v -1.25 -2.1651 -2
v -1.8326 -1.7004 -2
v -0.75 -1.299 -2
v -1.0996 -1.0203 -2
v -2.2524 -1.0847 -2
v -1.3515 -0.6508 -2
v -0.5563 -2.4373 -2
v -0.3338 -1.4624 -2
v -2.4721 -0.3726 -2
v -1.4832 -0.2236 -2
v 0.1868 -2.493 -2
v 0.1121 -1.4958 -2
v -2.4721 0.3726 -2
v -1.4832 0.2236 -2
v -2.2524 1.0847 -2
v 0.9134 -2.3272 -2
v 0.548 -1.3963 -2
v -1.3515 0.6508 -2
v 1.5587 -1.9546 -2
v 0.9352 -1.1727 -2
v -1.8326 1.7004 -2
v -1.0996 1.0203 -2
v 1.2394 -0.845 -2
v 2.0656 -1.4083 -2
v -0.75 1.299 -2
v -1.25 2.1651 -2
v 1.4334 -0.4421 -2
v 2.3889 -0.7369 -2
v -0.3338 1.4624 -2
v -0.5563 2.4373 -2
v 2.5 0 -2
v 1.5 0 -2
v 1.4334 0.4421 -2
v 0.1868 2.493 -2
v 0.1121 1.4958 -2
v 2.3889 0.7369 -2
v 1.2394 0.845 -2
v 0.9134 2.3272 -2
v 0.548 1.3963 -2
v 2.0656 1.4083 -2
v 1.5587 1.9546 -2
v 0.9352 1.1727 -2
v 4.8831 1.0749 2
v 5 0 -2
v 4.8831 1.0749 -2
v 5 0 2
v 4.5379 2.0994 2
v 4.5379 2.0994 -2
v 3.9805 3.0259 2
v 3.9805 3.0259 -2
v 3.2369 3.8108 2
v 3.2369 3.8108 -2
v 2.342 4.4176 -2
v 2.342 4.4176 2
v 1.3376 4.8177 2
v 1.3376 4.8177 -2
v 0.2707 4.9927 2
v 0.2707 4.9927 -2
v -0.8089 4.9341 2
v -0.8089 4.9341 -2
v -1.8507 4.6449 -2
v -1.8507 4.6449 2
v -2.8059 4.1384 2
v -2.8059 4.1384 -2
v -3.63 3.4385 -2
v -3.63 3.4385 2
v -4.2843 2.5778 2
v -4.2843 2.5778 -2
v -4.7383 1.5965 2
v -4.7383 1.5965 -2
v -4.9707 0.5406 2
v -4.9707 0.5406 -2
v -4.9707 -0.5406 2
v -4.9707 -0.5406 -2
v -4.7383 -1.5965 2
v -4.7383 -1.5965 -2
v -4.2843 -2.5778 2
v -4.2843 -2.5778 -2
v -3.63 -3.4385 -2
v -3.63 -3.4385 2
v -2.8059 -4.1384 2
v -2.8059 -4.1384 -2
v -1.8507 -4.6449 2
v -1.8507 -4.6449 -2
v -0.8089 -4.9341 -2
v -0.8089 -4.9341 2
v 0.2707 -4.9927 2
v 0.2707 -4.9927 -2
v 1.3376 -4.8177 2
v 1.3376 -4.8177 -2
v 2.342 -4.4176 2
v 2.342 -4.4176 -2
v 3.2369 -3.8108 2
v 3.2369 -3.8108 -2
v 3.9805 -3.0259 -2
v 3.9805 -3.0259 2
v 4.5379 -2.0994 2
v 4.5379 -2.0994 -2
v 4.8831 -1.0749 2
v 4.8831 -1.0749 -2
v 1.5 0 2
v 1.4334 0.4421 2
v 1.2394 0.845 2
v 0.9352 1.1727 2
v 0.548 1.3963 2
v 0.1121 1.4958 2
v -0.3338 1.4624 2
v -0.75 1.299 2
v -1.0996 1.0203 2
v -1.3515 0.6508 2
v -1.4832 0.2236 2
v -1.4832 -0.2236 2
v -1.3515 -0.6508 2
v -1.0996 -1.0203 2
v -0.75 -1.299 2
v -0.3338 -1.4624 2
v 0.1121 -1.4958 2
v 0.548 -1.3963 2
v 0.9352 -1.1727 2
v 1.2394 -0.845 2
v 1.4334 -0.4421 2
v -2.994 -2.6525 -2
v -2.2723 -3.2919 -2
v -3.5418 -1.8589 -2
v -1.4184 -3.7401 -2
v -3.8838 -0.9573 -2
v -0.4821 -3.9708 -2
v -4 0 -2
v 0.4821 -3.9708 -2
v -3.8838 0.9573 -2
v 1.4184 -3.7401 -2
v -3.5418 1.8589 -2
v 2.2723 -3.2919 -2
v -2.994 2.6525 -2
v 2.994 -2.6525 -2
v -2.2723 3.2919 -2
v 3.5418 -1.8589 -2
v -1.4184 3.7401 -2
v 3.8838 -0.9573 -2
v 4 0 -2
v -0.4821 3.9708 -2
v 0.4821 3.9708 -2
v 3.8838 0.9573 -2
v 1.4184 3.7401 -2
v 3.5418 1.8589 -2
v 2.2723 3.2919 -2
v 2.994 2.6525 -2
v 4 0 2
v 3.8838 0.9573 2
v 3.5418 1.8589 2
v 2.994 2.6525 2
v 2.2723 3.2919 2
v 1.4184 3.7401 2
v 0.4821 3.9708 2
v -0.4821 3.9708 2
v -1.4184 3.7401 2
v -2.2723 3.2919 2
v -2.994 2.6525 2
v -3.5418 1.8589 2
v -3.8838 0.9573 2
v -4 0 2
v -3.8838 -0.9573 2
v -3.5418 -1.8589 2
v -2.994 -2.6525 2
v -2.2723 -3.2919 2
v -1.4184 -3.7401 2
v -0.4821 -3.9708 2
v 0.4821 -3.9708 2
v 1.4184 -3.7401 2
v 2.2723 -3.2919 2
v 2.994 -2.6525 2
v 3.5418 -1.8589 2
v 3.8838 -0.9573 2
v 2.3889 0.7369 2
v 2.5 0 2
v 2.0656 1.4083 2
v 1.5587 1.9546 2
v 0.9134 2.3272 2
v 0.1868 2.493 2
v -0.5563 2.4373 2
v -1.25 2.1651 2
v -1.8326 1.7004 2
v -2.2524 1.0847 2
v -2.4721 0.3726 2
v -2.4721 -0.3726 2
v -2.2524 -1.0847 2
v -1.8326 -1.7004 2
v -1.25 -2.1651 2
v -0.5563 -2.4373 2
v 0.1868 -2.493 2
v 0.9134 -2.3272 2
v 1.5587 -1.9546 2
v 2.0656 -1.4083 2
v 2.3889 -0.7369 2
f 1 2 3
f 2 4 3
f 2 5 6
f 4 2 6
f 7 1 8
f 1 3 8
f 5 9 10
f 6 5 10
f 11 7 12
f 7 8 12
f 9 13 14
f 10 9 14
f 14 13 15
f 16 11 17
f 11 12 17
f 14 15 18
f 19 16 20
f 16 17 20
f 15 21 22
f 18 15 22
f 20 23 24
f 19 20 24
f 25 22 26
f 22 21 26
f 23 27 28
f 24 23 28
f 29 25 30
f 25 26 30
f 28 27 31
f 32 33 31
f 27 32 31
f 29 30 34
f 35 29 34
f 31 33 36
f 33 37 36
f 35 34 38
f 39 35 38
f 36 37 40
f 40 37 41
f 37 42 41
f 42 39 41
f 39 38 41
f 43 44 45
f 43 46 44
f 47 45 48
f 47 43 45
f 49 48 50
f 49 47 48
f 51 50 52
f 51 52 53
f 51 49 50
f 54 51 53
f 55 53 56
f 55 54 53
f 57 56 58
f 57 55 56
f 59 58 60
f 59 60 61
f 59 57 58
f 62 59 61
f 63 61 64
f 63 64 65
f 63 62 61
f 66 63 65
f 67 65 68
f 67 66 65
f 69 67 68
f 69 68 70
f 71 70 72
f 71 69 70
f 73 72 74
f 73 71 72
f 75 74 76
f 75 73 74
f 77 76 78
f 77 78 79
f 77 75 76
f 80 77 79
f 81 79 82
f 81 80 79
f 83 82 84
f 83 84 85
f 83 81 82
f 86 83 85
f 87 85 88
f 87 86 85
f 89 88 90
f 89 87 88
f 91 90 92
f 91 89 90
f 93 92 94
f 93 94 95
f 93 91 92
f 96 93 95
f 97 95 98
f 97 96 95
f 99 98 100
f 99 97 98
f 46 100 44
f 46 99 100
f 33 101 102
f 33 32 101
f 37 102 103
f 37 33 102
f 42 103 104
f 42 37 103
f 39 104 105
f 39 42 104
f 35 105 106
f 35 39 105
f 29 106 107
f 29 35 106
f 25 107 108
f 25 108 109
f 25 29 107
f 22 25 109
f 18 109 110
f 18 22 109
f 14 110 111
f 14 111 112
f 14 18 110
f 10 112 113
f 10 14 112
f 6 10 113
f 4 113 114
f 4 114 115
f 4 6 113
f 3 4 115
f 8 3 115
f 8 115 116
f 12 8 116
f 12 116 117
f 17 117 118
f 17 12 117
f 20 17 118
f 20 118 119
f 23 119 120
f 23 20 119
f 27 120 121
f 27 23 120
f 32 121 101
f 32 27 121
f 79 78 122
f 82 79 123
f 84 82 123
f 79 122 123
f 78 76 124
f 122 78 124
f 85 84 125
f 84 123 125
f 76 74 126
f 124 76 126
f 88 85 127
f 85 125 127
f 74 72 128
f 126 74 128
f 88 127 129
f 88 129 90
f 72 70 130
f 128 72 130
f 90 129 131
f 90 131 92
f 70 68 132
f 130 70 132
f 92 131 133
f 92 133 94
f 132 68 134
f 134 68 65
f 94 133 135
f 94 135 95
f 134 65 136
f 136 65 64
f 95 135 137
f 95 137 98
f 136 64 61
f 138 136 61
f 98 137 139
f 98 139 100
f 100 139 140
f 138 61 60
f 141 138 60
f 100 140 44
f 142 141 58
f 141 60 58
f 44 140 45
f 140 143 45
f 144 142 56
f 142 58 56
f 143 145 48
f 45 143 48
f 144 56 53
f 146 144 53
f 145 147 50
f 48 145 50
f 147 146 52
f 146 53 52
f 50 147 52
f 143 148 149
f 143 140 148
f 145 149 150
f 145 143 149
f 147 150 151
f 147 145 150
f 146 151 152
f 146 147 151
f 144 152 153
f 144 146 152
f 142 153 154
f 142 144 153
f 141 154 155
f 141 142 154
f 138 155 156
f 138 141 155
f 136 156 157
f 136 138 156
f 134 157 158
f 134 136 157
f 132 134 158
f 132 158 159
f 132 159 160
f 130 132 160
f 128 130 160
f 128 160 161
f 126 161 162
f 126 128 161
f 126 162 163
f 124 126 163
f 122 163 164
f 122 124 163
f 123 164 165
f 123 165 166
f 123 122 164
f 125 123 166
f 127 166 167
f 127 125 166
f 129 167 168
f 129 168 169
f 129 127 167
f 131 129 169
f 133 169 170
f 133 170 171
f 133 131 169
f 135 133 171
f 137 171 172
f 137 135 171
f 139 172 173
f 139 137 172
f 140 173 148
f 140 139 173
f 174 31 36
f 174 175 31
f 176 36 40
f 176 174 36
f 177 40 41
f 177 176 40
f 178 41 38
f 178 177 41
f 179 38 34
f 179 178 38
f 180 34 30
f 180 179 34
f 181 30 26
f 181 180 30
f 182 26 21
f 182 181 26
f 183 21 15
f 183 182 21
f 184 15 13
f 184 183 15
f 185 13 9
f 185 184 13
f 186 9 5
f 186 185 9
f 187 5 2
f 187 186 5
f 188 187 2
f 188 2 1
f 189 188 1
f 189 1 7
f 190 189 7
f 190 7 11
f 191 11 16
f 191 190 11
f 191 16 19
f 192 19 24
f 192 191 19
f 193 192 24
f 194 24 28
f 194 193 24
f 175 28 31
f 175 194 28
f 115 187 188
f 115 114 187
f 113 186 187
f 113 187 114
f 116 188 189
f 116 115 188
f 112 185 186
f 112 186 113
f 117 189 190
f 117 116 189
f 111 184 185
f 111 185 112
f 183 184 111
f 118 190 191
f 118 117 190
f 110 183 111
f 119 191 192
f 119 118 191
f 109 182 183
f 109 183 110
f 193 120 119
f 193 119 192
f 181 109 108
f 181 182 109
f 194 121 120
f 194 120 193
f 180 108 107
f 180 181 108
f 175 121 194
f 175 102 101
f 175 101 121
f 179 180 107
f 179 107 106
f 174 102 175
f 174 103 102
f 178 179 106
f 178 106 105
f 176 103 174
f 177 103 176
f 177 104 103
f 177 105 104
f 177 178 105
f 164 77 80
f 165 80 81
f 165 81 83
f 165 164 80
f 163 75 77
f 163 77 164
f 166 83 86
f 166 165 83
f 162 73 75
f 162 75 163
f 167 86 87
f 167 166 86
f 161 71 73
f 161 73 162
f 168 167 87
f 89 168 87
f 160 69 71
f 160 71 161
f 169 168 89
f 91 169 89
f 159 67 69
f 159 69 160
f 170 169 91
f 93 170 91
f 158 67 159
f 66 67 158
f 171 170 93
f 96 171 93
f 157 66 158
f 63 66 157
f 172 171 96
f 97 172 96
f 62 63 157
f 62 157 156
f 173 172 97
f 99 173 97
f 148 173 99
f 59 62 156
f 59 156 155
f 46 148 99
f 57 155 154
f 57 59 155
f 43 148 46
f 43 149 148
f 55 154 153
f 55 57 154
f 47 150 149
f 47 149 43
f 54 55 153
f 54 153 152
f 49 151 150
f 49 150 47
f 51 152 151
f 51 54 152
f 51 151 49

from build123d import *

# Parameters (mm, degrees)
SKETCH_1_R      = 5
SKETCH_1_R_2    = 4
EXTRUDE_1_DEPTH = 2
SKETCH_2_R      = 2.5
SKETCH_2_R_2    = 1.5
EXTRUDE_2_DEPTH = 2


with BuildPart() as part:
    # 草图1 → 凸台-拉伸1 (new, symmetric)
    with BuildSketch(Plane.XY):
        Circle(SKETCH_1_R)
        Circle(SKETCH_1_R_2, mode=Mode.SUBTRACT)
    extrude(amount=EXTRUDE_1_DEPTH, both=True)


with BuildPart() as body_2:
    # 草图2 → 凸台-拉伸2 (new, symmetric)
    with BuildSketch(Plane.XY):
        Circle(SKETCH_2_R)
        Circle(SKETCH_2_R_2, mode=Mode.SUBTRACT)
    extrude(amount=EXTRUDE_2_DEPTH, both=True)


solid = Compound([part.part, body_2.part])
